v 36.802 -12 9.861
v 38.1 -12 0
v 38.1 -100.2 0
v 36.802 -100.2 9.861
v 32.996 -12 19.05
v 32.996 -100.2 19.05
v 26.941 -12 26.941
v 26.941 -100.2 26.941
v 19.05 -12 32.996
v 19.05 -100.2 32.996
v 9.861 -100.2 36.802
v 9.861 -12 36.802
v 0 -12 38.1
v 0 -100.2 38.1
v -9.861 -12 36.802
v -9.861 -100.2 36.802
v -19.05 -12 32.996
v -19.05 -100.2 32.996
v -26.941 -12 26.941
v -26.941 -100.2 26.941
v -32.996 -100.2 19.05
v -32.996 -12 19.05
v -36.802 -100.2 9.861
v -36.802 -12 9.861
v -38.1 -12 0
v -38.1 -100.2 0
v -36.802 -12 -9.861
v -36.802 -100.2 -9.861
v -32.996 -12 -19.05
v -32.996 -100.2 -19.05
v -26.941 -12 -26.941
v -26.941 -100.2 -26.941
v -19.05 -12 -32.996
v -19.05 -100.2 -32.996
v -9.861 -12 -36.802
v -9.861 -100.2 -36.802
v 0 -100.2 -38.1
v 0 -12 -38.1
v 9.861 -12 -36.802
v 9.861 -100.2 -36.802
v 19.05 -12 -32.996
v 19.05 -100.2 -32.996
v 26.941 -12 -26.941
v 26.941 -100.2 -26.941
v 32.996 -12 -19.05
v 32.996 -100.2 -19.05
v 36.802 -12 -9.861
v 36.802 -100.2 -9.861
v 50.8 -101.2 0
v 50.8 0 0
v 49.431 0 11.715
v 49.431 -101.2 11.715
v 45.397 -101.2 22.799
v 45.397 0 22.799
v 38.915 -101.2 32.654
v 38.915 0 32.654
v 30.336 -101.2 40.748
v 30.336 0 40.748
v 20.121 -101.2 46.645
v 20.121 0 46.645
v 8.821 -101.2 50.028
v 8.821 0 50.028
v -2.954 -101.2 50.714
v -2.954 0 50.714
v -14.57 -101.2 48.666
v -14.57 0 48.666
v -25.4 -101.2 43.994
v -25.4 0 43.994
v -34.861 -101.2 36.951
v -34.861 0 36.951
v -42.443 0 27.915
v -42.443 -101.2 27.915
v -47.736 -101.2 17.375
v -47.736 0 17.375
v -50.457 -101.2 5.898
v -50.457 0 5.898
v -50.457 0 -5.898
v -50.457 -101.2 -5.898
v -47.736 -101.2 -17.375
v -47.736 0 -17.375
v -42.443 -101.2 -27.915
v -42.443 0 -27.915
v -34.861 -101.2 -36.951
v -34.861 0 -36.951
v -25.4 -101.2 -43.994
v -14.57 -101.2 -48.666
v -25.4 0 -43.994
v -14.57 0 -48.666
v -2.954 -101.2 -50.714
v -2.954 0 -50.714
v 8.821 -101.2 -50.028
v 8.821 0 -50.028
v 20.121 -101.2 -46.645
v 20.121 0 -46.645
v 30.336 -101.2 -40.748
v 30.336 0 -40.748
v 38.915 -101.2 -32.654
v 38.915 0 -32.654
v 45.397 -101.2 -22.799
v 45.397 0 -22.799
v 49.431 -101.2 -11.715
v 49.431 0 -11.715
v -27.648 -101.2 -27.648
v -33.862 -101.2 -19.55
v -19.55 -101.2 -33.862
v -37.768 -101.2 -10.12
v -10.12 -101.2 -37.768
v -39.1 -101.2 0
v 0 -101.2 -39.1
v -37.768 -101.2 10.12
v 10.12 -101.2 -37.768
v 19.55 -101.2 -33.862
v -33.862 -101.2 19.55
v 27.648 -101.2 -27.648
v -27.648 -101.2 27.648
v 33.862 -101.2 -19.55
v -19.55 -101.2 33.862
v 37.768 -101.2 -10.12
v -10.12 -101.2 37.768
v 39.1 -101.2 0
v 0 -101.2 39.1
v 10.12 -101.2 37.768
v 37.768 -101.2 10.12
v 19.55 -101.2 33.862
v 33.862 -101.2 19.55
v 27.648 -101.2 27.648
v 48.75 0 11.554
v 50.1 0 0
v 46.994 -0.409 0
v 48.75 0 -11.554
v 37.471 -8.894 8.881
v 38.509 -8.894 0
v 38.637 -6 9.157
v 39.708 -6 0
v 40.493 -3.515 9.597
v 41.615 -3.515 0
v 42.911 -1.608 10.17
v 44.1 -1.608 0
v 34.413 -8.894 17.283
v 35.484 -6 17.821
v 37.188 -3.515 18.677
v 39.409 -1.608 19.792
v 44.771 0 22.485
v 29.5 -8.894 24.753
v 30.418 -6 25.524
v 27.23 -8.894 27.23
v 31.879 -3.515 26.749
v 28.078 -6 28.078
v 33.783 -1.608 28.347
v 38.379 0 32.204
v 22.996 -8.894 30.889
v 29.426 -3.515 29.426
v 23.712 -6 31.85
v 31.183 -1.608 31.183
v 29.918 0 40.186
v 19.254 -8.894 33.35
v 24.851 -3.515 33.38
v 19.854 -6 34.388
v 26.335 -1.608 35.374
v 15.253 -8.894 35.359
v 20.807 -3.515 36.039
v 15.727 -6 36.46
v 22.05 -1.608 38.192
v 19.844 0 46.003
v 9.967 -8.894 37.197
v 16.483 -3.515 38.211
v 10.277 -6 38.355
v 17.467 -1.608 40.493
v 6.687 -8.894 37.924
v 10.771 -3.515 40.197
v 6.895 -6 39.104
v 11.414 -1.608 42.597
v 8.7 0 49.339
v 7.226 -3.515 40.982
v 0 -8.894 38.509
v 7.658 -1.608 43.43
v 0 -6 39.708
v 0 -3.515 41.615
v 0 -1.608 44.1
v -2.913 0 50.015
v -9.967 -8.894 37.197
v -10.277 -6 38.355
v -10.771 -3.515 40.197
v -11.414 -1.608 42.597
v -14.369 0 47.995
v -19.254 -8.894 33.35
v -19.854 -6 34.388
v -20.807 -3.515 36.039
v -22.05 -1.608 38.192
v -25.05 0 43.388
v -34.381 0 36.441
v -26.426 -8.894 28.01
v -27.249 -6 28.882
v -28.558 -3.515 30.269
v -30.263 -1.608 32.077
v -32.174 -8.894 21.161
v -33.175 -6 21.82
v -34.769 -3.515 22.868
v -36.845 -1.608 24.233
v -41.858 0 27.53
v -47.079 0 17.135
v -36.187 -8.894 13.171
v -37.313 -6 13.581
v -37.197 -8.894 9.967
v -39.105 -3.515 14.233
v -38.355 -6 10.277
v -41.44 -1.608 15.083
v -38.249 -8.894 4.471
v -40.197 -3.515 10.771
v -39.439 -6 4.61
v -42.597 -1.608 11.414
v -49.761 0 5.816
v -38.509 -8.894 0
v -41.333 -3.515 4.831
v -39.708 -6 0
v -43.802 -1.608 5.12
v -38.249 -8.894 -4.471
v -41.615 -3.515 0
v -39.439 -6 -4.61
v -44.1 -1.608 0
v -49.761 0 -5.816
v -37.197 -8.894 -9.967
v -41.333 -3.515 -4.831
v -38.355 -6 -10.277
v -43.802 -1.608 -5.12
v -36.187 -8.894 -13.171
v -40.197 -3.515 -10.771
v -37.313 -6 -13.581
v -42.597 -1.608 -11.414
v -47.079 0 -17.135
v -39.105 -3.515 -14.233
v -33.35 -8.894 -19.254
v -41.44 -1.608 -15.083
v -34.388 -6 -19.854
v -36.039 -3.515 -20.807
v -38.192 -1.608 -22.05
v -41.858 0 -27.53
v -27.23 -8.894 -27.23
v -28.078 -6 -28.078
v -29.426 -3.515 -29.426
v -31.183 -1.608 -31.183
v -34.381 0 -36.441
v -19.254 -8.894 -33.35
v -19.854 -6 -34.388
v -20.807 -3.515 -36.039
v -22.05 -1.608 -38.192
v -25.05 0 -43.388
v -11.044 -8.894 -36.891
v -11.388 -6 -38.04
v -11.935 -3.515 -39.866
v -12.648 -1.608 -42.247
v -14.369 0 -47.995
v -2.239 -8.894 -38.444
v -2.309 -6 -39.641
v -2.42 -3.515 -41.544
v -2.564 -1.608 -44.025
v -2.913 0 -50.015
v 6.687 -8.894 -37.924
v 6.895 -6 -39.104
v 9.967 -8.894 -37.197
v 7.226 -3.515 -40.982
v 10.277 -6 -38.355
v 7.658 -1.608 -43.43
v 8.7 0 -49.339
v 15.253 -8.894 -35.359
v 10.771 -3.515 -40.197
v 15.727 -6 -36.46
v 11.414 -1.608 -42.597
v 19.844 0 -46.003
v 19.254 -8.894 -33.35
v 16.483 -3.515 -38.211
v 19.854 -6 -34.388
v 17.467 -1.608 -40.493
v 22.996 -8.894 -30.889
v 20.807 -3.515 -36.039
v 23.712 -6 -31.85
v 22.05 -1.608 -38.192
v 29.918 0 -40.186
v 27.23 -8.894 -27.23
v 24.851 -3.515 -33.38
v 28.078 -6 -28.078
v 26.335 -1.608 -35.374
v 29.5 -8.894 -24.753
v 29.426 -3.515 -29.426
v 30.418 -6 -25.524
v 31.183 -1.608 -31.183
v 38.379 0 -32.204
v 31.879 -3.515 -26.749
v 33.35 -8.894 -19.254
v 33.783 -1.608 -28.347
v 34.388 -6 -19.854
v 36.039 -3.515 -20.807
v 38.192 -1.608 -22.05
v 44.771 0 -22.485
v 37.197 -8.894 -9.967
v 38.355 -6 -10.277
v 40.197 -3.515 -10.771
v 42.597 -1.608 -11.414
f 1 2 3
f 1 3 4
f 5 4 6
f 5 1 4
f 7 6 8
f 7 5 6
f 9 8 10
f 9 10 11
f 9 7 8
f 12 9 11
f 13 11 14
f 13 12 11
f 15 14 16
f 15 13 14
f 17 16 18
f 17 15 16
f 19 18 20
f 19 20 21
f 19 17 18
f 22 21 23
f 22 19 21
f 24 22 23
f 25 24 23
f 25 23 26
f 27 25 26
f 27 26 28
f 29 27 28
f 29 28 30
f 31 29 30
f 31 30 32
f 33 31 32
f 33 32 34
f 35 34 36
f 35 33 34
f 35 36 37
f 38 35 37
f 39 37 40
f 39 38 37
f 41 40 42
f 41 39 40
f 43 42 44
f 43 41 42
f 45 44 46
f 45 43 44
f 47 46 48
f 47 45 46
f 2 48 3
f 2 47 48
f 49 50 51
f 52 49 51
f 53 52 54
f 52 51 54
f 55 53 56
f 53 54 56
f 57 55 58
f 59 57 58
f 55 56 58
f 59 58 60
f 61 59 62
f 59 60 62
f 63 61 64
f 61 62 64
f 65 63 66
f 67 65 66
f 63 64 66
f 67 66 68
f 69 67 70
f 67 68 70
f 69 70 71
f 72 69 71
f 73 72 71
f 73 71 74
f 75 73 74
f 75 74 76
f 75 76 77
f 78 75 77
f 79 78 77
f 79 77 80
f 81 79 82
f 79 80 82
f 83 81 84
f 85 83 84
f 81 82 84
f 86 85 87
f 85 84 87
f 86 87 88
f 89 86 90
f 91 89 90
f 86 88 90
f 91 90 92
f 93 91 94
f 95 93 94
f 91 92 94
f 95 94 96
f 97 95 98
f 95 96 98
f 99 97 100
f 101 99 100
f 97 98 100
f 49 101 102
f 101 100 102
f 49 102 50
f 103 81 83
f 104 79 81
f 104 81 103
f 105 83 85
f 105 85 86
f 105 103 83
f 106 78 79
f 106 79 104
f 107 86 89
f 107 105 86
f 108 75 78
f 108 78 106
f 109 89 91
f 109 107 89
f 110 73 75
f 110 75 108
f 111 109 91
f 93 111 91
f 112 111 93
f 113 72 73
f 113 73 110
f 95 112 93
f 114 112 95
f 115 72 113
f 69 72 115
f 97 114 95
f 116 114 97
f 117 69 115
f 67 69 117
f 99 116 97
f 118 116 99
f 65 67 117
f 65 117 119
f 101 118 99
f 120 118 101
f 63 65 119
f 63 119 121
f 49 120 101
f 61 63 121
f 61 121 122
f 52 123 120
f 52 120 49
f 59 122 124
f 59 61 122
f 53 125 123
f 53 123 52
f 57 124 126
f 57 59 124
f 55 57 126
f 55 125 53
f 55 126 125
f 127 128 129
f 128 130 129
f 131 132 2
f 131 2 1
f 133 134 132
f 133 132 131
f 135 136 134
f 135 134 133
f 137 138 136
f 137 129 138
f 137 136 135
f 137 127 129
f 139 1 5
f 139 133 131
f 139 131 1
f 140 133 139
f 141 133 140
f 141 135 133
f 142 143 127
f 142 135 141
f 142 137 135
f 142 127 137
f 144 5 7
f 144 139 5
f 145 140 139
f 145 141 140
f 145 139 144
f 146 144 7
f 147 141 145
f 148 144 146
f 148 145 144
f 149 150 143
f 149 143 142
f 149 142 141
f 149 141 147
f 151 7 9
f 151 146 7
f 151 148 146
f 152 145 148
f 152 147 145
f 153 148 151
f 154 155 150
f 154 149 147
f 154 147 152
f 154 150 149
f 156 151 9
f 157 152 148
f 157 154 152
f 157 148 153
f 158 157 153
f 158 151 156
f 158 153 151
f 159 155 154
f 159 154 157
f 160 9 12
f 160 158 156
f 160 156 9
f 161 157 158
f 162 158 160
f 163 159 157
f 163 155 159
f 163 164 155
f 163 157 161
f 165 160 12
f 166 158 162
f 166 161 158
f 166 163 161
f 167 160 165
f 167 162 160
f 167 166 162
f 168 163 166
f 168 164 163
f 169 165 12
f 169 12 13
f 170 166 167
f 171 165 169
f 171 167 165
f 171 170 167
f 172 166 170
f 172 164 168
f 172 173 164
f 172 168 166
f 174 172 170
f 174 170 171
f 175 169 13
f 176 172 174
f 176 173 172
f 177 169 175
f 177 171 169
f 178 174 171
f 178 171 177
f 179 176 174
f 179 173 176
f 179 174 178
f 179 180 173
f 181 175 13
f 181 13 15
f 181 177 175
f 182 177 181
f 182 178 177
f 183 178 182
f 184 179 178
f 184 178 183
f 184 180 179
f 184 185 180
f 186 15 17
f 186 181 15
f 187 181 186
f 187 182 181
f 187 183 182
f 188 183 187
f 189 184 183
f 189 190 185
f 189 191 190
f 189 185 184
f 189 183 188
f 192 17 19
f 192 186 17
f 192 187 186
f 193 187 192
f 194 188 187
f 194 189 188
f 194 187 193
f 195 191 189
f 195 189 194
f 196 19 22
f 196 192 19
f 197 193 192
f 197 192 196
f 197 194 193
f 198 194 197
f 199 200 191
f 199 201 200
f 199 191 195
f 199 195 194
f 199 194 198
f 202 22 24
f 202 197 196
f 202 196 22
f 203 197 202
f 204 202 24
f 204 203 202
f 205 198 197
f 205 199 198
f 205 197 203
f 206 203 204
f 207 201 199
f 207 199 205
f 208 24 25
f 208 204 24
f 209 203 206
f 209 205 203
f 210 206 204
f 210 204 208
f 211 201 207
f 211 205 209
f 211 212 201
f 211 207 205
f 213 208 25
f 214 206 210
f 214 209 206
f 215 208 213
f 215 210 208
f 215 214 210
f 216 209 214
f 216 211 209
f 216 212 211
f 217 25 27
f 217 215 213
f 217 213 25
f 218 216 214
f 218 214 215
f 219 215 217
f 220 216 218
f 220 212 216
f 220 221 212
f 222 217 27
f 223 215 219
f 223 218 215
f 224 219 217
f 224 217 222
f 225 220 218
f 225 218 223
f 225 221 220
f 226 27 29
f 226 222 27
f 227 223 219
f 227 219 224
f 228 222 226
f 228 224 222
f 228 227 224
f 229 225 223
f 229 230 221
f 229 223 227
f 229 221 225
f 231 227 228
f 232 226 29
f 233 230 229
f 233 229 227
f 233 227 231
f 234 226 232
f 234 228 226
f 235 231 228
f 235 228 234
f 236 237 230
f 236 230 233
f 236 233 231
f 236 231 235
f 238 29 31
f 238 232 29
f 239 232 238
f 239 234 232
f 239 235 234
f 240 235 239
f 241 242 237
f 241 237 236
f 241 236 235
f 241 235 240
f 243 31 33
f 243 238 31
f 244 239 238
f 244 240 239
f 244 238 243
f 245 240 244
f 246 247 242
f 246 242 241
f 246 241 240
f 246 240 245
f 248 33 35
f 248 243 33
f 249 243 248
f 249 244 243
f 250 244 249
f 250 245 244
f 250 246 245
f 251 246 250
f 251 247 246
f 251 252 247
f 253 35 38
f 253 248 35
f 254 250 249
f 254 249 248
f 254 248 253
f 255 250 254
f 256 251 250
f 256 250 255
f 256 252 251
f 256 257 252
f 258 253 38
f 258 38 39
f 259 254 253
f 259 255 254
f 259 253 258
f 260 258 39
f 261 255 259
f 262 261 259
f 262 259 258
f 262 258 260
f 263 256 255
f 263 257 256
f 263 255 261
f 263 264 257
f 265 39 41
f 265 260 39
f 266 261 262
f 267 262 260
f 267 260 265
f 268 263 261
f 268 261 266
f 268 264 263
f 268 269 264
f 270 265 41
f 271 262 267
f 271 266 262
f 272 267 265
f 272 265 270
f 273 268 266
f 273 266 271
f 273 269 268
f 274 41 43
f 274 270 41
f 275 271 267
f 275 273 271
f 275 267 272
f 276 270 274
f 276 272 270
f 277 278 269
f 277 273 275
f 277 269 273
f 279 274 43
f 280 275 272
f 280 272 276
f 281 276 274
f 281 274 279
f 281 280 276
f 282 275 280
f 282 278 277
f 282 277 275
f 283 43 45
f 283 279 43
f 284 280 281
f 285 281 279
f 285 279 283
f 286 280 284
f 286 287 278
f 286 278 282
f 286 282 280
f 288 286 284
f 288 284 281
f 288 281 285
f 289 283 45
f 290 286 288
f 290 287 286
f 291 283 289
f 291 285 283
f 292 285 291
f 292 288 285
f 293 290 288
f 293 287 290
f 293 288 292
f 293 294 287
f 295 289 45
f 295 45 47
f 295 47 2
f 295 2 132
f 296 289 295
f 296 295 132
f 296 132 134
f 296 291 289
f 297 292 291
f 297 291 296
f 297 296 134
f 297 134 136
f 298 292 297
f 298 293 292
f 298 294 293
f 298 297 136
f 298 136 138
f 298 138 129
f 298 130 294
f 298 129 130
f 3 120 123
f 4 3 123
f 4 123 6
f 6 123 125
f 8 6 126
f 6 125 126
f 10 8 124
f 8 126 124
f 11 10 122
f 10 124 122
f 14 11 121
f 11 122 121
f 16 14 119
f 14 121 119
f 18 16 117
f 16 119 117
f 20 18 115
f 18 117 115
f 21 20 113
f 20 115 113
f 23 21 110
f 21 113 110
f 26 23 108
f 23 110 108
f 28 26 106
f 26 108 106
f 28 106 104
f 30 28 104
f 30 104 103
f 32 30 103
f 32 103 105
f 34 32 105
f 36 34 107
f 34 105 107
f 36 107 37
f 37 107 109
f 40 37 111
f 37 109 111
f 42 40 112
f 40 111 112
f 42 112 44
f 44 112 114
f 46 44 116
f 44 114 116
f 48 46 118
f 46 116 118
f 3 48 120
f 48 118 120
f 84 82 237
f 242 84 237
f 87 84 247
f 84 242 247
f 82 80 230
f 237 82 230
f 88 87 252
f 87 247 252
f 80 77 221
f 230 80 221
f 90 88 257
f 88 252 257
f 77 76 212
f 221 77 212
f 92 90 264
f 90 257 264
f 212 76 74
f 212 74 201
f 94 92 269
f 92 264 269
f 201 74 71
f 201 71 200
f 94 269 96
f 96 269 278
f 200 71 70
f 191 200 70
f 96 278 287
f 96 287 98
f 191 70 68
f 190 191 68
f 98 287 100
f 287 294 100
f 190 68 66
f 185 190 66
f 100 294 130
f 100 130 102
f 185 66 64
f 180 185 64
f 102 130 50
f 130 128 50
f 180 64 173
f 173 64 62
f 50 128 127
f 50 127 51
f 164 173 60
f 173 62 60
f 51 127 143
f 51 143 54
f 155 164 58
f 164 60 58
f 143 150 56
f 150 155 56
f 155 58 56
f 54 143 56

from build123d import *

# Parameters (mm, degrees)
F0_R     = 50.8
F0_R_2   = 38.1
F1_DEPTH = 101.2
F2_R     = 12
F3_SIZE  = 1


with BuildPart() as f1:
    # F0 (on Front) → F1 (new body)
    with BuildSketch(Plane.XZ):
        Circle(F0_R)
        Circle(F0_R_2, mode=Mode.SUBTRACT)
    extrude(amount=F1_DEPTH)

    # F2
    f2_edges = [f1.edges().sort_by_distance(p)[0] for p in [
        (-38.1, 0, 0),
    ]]
    fillet(f2_edges, radius=F2_R)

    # F3
    f3_edges = [f1.edges().sort_by_distance(p)[0] for p in [
        (38.1, -56.6, 0),
        (-38.1, -12, 0),
        (-38.1, -101.2, 0),
    ]]
    chamfer(f3_edges, length=F3_SIZE)


solid = f1.part
